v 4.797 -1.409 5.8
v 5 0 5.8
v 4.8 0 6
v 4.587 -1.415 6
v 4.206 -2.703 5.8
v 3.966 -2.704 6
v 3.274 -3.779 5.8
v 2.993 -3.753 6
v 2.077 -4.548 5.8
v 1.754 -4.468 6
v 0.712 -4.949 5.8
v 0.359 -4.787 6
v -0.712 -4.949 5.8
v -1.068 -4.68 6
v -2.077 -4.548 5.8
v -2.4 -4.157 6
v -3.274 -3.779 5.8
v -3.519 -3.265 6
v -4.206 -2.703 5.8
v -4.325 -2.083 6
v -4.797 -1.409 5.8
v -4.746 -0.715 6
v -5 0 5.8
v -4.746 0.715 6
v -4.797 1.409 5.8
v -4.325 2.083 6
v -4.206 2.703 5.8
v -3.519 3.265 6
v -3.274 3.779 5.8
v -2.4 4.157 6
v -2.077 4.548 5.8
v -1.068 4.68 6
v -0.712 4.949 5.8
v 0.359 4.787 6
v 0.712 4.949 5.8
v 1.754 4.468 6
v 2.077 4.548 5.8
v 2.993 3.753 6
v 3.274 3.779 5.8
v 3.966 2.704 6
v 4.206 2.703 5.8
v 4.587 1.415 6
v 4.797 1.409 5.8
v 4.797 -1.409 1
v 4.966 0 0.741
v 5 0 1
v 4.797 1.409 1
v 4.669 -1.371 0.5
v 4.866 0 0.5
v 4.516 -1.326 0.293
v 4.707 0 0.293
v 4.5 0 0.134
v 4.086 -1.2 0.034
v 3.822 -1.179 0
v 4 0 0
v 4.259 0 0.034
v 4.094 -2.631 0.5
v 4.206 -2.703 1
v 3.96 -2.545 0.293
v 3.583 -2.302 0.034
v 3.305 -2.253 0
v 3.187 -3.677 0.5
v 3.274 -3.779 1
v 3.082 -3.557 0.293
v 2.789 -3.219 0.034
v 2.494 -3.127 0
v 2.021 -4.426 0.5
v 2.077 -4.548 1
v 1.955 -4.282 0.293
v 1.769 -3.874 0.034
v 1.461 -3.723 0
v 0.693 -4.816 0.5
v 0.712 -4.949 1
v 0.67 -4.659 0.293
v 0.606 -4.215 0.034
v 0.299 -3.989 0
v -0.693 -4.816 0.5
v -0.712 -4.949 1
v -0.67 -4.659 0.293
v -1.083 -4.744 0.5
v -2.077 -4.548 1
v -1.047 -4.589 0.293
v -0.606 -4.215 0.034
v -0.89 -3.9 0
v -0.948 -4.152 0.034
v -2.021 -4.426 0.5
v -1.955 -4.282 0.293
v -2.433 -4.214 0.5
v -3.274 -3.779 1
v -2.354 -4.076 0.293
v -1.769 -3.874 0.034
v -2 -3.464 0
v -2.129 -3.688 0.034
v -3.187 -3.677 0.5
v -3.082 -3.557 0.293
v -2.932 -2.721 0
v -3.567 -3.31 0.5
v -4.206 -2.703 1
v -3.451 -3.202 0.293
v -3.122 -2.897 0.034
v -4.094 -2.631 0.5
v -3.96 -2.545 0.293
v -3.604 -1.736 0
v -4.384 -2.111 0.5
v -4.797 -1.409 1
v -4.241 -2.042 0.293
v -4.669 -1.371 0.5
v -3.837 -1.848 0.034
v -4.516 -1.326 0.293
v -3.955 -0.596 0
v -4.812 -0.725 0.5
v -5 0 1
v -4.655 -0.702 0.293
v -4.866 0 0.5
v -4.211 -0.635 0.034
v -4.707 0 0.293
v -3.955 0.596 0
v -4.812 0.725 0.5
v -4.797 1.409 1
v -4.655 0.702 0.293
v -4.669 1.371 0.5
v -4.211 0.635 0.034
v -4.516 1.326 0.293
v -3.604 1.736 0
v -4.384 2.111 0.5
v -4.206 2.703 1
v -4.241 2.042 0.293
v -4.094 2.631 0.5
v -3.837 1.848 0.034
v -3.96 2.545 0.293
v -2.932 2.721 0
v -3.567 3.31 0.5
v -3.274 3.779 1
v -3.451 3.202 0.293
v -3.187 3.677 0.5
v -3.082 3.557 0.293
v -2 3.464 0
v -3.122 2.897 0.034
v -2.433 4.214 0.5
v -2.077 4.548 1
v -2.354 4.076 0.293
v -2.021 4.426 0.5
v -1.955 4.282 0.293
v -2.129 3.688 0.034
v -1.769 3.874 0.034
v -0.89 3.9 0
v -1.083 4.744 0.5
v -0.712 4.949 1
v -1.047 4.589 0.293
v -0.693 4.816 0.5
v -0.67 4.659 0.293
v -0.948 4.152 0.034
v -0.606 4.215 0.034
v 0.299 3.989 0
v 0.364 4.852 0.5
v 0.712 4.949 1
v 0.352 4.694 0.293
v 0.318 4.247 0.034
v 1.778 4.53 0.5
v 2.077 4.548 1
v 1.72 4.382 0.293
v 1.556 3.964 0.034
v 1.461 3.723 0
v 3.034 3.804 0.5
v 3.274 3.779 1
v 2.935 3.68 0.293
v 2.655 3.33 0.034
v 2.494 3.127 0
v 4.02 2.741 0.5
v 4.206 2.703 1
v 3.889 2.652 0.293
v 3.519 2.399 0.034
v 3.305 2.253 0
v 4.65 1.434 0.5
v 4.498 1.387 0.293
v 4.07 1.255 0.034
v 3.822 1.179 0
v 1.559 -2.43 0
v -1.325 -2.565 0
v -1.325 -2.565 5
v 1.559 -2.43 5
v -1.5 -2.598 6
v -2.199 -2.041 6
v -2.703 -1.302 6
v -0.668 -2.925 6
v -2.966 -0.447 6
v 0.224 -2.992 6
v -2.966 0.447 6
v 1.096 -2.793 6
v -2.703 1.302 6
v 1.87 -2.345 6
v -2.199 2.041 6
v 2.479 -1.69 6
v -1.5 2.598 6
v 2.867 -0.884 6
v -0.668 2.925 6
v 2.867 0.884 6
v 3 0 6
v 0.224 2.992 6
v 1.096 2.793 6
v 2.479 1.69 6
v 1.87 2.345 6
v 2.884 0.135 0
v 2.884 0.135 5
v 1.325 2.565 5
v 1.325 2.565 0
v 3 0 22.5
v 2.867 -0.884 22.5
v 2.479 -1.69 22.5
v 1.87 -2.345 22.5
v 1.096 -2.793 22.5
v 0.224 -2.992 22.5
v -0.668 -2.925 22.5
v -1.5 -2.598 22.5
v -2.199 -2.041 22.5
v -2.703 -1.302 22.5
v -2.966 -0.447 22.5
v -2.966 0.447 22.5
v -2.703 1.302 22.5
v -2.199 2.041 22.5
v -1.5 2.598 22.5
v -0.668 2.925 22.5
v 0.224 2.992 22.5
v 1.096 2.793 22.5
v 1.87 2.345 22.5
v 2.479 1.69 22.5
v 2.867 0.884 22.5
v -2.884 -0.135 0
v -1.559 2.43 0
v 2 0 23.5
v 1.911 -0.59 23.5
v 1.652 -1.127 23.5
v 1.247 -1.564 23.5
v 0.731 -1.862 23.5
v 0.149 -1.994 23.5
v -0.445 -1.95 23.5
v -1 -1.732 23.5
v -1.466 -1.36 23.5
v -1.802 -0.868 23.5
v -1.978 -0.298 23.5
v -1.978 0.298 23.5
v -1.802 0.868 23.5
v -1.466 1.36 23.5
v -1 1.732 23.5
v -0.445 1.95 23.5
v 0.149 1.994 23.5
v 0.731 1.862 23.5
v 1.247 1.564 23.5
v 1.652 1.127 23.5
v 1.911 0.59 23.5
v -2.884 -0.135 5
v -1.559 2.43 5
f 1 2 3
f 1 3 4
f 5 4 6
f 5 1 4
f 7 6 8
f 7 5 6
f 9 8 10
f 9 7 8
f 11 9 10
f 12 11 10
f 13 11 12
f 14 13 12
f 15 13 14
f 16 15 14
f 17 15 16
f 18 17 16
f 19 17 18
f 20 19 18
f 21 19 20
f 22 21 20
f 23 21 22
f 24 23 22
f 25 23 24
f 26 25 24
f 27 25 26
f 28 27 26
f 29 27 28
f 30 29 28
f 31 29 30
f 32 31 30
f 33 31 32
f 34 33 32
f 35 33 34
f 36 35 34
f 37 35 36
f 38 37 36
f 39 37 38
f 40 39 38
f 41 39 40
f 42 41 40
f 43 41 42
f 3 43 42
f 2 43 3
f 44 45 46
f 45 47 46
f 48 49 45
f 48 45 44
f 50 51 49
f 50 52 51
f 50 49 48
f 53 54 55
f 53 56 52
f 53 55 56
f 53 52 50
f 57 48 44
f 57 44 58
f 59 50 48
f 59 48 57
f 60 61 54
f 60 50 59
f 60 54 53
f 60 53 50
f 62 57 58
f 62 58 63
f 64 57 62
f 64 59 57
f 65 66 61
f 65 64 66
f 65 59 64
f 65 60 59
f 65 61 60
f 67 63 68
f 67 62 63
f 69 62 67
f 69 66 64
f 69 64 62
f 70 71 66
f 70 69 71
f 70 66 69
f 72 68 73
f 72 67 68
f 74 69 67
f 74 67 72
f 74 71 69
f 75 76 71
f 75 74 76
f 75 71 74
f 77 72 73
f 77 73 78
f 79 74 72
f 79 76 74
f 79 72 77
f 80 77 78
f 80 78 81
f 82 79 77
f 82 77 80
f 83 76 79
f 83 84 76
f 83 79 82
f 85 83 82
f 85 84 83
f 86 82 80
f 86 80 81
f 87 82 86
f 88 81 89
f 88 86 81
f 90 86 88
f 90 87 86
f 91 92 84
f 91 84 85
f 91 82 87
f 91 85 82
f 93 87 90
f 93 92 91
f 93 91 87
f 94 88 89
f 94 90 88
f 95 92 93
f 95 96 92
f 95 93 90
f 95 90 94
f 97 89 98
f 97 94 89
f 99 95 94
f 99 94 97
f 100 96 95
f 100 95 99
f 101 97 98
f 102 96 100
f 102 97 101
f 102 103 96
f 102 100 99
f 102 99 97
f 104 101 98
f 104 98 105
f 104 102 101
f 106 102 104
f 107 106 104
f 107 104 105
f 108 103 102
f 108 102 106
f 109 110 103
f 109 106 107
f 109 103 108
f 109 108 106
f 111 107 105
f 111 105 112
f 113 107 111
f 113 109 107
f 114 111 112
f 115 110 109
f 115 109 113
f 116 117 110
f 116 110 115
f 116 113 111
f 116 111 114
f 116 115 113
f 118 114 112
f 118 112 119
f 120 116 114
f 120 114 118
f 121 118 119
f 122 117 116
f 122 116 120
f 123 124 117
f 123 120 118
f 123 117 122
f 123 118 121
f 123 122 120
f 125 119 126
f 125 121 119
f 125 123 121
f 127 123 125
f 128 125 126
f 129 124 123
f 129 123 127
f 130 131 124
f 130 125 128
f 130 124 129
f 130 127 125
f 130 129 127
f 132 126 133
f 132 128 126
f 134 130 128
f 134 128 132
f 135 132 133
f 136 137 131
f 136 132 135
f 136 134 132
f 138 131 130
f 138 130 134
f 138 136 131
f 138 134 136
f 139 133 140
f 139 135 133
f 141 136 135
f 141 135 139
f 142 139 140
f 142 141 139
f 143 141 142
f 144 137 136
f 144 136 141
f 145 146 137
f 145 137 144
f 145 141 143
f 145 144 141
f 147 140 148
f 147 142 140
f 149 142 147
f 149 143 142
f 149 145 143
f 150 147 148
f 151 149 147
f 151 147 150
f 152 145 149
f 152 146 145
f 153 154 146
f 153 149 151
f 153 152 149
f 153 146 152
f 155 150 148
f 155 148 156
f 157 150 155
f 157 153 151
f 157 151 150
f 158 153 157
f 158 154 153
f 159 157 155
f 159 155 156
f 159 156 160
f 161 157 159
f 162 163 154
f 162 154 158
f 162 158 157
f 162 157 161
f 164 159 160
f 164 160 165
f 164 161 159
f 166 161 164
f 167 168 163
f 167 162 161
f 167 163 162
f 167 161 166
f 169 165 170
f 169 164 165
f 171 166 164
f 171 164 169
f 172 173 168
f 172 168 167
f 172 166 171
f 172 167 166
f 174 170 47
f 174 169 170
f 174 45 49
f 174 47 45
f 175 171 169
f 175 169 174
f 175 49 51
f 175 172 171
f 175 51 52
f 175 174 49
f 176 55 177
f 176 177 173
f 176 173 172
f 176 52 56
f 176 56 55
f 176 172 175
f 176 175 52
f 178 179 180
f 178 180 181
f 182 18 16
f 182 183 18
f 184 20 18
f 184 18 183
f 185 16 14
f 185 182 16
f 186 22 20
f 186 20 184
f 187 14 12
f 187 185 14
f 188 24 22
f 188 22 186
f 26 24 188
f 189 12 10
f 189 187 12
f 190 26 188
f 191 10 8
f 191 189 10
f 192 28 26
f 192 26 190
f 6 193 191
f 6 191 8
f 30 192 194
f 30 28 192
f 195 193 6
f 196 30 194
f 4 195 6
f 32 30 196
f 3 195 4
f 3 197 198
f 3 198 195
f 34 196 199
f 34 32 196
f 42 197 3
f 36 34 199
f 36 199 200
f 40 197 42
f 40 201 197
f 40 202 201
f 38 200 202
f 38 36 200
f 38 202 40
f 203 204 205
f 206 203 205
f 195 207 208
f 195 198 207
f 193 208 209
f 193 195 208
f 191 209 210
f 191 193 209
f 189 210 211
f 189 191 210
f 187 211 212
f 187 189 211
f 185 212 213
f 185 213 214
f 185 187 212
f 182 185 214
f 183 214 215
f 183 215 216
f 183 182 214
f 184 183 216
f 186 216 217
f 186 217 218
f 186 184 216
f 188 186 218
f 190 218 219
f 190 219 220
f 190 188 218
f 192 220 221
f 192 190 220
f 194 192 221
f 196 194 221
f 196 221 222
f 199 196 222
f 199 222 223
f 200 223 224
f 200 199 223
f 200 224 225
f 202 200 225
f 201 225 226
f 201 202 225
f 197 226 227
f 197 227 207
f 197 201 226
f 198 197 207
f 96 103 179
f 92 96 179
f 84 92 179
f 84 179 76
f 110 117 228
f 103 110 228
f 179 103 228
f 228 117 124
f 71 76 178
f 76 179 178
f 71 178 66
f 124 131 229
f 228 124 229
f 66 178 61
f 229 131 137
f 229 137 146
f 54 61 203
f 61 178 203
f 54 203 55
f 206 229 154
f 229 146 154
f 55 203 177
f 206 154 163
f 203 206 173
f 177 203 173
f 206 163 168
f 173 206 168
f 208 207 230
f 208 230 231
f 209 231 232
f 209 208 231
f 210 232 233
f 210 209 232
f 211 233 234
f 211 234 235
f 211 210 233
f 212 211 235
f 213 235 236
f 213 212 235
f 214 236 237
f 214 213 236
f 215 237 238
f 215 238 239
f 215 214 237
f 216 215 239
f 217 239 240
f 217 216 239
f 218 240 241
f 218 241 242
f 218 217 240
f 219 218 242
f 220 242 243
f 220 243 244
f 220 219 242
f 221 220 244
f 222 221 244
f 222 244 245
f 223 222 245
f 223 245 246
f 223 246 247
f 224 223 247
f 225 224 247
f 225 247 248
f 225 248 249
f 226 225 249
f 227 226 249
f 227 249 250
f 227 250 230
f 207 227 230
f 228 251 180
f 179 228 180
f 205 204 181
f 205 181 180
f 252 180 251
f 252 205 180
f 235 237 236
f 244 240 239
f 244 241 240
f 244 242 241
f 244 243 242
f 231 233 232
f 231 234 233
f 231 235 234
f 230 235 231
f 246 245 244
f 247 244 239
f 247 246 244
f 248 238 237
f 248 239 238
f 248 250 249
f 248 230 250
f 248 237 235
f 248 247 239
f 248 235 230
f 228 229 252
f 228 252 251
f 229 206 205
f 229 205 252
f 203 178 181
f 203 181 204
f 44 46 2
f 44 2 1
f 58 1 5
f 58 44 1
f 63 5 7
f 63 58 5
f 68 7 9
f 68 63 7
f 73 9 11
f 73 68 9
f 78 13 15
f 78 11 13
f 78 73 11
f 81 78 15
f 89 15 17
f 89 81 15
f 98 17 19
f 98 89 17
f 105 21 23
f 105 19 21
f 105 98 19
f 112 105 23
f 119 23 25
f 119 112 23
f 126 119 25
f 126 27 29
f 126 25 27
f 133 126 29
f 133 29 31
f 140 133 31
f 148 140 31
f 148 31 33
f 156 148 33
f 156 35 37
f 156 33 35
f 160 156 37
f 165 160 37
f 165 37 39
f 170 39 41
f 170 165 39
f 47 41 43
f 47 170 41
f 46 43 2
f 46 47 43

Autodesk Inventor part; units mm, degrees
ref_plane "YZ Plane" through (0, 0, 0) normal (1, 0, 0) x (0, 1, 0)
ref_plane "XZ Plane" through (0, 0, 0) normal (0, 1, 0) x (-1, 0, 0)
ref_plane "XY Plane" through (0, 0, 0) normal (0, 0, 1) x (1, 0, 0)
sketch "Sketch1" plane through (0, 0, 0) normal (0, 0, 1) x (1, 0, 0)
  circle A0 centre (0, 0) radius 5
  dimension "d0" = 10
extrude "Extrusion1" add sketch "Sketch1" along normal blind 6
sketch "Sketch2" plane through (0, 0, 6) normal (0, 0, 1) x (1, 0, 0)
  circle A0 centre (0, 0) radius 5 projected
  circle A1 centre (0, 0) radius 3
  dimension "d3" = 6
extrude "Extrusion2" add sketch "Sketch2" along normal blind 25 contours A1
thread "Thread1" size "M6x1" class "6g" standard "ANSI Metric M Profile" full length
chamfer "Chamfer1" distance 1 angle 45 1 edges at (-3, 0, 31)
chamfer "Chamfer2" distance 0.2 angle 45 1 edges at (-5, 0, 6)
fillet "Fillet1" radius 1 1 edges at (-5, 0, 0)
sketch "Sketch3" plane through (0, 0, 0) normal (0, 0, -1) x (-1, 0, 0)
  circle A0 centre (0, 0) radius 4 projected
  line L0 (1.5588, 2.4297) -> (2.8836, -0.135)
  line L1 (2.8836, -0.135) -> (1.3248, -2.5648)
  line L2 (1.3248, -2.5648) -> (-1.5588, -2.4297)
  line L3 (-1.5588, -2.4297) -> (-2.8836, 0.135)
  line L4 (-2.8836, 0.135) -> (-1.3248, 2.5648)
  line L5 (-1.3248, 2.5648) -> (1.5588, 2.4297)
  dimension "d15" = 5
extrude "Extrusion3" cut sketch "Sketch3" against normal blind 5 contours L0 L1 L2 L3 L4 L5
sketch "Boceto4" plane through (0, 0, 31) normal (0, 0, 1) x (1, 0, 0)
  circle A0 centre (0, 0) radius 12.7903
extrude "Extrusión4" cut sketch "Boceto4" against normal blind 7.5
chamfer "Chaflán3" distance 1 angle 45 1 edges at (-3, 0, 23.5)
properties part number "PERNO PARKER M5"
